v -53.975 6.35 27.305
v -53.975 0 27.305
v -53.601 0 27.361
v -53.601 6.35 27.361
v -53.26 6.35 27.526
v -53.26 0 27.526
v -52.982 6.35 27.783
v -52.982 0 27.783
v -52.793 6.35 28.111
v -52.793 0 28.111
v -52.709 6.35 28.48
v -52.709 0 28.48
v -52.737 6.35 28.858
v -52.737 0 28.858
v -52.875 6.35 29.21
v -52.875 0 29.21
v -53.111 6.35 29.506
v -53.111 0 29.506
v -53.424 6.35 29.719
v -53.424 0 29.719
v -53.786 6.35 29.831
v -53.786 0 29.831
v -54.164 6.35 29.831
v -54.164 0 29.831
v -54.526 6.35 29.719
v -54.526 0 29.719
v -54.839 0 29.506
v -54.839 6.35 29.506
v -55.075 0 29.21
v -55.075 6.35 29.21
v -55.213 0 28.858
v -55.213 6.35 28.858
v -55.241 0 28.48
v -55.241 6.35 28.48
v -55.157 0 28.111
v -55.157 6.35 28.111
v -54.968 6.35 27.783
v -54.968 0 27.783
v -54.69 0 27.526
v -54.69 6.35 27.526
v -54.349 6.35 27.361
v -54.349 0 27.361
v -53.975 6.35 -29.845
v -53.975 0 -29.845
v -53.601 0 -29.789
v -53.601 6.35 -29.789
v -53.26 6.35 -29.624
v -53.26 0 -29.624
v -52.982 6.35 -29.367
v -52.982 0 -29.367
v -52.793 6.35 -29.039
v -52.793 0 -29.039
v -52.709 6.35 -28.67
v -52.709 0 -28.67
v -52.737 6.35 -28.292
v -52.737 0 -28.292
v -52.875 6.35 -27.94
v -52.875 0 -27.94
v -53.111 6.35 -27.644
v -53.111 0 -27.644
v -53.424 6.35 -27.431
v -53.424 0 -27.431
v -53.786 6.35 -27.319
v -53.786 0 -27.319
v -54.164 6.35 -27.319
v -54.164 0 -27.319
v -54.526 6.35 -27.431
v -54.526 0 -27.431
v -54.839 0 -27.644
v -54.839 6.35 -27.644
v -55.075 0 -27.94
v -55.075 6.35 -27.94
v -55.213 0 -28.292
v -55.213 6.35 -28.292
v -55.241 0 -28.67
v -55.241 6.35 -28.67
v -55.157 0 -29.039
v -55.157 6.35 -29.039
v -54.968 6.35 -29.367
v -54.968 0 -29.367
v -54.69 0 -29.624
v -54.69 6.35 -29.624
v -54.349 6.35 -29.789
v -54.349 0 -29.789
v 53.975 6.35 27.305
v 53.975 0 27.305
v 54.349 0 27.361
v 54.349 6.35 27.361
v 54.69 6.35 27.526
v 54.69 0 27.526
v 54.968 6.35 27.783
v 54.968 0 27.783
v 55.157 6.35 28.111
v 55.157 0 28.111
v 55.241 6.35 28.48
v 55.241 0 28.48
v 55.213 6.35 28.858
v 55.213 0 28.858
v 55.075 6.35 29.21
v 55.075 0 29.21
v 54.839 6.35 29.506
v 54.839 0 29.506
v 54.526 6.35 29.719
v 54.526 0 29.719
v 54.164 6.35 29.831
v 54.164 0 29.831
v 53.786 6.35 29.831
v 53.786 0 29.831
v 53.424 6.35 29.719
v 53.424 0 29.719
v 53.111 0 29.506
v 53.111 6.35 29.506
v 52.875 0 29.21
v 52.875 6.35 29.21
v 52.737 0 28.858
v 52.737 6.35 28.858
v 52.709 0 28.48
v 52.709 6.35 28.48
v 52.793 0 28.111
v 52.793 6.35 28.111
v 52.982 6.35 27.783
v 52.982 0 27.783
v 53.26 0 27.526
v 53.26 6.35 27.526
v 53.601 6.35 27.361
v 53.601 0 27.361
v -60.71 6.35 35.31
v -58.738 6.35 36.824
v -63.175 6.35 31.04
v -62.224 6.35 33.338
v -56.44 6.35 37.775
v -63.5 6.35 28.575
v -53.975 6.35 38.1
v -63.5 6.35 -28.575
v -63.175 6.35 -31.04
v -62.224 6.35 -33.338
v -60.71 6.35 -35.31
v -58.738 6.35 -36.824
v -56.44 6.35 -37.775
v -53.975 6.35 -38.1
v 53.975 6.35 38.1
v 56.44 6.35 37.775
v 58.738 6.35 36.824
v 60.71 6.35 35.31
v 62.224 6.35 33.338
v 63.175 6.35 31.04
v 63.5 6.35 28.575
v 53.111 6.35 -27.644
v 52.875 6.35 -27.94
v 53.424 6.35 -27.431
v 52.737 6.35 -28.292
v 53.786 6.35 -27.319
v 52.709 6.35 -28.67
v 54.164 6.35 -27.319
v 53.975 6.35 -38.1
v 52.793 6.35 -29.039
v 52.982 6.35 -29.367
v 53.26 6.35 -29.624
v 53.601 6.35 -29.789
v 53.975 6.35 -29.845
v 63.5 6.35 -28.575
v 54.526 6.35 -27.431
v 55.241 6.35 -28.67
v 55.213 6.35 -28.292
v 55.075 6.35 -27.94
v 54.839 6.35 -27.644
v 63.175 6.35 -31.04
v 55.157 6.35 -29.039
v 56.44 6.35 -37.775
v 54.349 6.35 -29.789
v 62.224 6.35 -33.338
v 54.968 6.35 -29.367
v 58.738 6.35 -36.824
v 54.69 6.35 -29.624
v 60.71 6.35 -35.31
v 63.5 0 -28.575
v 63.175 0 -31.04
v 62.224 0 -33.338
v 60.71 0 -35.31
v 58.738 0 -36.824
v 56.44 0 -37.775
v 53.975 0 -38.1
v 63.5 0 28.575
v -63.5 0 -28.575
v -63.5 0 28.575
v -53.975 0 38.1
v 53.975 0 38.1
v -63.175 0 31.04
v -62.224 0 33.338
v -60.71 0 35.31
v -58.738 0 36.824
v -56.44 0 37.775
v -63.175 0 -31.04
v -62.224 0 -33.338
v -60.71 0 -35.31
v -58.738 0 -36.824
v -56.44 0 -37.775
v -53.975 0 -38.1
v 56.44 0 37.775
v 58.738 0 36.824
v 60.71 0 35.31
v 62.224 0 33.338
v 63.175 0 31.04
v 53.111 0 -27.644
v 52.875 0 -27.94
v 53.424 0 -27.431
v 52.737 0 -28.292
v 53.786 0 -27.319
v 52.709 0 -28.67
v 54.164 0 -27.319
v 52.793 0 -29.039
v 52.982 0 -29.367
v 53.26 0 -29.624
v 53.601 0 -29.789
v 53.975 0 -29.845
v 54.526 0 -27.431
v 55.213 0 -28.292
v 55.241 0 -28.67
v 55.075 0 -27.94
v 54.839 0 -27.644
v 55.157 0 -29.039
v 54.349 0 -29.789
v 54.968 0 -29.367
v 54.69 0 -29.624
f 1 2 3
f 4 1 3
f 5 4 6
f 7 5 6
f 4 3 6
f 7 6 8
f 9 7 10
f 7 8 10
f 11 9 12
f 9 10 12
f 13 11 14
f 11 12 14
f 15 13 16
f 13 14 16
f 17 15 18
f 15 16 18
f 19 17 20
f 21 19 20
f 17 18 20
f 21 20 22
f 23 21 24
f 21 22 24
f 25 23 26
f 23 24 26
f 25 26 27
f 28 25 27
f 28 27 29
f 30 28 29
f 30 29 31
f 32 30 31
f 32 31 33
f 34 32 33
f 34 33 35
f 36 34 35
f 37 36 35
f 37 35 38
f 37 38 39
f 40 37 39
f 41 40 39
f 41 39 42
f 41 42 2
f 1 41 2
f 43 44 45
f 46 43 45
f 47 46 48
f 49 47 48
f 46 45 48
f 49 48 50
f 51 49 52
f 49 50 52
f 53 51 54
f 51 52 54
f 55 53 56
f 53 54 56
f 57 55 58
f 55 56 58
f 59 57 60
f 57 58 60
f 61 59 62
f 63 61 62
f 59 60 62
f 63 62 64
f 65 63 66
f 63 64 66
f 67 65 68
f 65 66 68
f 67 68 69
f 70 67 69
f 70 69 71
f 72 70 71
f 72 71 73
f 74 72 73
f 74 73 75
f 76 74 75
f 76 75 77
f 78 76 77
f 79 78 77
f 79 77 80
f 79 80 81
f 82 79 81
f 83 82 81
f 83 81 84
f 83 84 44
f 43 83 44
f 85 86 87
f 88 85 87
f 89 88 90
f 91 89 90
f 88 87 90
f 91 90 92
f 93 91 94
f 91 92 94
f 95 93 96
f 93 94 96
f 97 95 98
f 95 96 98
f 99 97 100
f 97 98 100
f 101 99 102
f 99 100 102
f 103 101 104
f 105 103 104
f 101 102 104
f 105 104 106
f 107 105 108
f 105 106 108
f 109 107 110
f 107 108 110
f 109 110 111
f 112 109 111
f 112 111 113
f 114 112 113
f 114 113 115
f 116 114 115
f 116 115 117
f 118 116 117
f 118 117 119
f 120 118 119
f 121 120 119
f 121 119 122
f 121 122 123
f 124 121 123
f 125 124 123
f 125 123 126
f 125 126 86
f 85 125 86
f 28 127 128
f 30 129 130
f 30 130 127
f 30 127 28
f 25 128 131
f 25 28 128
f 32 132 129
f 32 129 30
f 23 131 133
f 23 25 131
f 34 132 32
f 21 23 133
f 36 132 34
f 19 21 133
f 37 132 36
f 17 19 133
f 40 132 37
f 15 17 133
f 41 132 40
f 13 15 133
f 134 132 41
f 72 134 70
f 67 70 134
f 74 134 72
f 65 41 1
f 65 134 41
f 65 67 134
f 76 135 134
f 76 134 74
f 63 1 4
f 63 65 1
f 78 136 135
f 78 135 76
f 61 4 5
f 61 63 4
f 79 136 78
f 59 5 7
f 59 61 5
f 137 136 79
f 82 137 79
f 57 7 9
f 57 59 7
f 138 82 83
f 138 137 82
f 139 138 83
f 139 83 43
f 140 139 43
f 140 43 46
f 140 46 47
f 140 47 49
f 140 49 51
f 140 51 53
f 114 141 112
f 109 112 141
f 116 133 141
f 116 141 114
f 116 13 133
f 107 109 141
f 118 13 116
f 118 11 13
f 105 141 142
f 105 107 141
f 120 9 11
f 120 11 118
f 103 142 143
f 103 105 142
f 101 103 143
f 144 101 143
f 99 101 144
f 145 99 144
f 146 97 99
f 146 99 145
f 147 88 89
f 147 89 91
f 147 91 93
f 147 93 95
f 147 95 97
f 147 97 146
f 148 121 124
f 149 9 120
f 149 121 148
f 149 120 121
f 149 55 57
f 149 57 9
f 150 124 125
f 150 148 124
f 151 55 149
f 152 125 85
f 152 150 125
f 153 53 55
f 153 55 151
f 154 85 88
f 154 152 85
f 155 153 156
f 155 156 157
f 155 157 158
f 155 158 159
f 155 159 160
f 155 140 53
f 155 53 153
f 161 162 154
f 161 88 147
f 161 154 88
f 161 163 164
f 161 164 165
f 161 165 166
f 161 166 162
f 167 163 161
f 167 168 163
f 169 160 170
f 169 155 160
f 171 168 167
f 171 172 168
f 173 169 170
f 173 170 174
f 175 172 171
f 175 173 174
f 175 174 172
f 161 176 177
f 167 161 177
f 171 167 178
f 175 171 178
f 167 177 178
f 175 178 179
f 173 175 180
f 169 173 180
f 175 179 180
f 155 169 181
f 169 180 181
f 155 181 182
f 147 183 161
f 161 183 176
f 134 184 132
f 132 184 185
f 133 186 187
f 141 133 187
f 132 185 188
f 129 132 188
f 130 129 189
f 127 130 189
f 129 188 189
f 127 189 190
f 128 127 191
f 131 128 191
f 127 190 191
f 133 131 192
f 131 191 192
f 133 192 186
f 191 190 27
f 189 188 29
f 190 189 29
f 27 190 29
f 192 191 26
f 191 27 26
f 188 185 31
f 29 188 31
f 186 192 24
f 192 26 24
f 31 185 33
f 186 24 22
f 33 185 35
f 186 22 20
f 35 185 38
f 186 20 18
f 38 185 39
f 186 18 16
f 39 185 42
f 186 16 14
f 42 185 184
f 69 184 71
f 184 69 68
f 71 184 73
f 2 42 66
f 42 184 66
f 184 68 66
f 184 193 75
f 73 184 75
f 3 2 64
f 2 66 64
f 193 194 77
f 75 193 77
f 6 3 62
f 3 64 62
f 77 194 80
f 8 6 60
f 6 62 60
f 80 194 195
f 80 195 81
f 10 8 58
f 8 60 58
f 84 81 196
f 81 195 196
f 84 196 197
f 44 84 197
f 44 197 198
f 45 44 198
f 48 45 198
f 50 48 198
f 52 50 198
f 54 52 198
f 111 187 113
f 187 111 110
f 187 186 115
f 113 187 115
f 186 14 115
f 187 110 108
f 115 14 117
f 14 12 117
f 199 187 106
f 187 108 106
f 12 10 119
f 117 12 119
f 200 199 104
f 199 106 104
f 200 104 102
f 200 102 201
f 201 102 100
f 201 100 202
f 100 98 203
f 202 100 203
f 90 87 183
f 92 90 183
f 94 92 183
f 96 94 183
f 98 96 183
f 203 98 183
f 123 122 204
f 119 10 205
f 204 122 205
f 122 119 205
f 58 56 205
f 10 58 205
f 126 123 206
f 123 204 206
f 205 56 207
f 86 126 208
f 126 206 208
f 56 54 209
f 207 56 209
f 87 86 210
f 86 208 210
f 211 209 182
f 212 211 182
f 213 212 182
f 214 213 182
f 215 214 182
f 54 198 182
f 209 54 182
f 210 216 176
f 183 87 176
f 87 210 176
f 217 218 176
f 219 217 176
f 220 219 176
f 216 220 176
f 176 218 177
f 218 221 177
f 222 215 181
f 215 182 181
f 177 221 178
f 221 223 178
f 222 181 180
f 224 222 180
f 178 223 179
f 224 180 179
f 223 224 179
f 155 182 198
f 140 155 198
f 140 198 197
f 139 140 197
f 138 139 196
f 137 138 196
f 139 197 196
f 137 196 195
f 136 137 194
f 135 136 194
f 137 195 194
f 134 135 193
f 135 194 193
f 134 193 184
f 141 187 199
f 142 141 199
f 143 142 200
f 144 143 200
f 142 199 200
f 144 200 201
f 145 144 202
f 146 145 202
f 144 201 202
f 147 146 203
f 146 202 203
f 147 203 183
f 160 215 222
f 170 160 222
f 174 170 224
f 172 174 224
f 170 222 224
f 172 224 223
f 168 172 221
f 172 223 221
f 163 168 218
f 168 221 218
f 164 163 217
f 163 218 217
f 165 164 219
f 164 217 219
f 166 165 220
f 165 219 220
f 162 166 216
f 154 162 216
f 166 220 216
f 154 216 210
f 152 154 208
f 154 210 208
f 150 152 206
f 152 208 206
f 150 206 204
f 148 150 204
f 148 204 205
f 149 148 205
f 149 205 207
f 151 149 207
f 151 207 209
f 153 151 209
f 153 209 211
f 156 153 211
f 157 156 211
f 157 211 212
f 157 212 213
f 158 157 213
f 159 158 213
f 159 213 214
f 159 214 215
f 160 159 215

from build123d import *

# Parameters (mm, degrees)
BOSS_EXTRUDE1_DEPTH       = 6.35
F_6_40_TAPPED_HOLE2_D     = 2.54
F_6_40_TAPPED_HOLE2_DEPTH = 8.9154
F_6_40_TAPPED_HOLE2_TIP   = 0.763092986


with BuildPart() as part:
    # Sketch1 → Boss-Extrude1 (new body)
    with BuildSketch(Plane(origin=(0, 0, 0), x_dir=(1, 0, 0), z_dir=(0, 1, 0))):
        with BuildLine():
            Line((63.5, -28.575), (63.5, 28.575))
            ThreePointArc((63.5, 28.575), (60.710192091, 35.310192091), (53.975, 38.1))
            Line((53.975, 38.1), (-53.975, 38.1))
            ThreePointArc((-53.975, 38.1), (-60.710192091, 35.310192091), (-63.5, 28.575))
            Line((-63.5, 28.575), (-63.5, -28.575))
            ThreePointArc((-63.5, -28.575), (-60.710192091, -35.310192091), (-53.975, -38.1))
            Line((-53.975, -38.1), (53.975, -38.1))
            ThreePointArc((53.975, -38.1), (60.710192091, -35.310192091), (63.5, -28.575))
        make_face()
    extrude(amount=BOSS_EXTRUDE1_DEPTH)

    # #6-40 Tapped Hole2
    with Locations(Plane(origin=(53.975, 6.35, -28.575), x_dir=(0, 0, 1), z_dir=(0, 1, 0))):
        with Locations((0, 0), (57.15, 0), (0, -107.95), (57.15, -107.95)):
            Hole(F_6_40_TAPPED_HOLE2_D / 2, depth=F_6_40_TAPPED_HOLE2_DEPTH)
            with Locations((0, 0, -(F_6_40_TAPPED_HOLE2_DEPTH + F_6_40_TAPPED_HOLE2_TIP / 2))):  # 118° drill point
                Cone(0, F_6_40_TAPPED_HOLE2_D / 2, F_6_40_TAPPED_HOLE2_TIP, mode=Mode.SUBTRACT)


solid = part.part
